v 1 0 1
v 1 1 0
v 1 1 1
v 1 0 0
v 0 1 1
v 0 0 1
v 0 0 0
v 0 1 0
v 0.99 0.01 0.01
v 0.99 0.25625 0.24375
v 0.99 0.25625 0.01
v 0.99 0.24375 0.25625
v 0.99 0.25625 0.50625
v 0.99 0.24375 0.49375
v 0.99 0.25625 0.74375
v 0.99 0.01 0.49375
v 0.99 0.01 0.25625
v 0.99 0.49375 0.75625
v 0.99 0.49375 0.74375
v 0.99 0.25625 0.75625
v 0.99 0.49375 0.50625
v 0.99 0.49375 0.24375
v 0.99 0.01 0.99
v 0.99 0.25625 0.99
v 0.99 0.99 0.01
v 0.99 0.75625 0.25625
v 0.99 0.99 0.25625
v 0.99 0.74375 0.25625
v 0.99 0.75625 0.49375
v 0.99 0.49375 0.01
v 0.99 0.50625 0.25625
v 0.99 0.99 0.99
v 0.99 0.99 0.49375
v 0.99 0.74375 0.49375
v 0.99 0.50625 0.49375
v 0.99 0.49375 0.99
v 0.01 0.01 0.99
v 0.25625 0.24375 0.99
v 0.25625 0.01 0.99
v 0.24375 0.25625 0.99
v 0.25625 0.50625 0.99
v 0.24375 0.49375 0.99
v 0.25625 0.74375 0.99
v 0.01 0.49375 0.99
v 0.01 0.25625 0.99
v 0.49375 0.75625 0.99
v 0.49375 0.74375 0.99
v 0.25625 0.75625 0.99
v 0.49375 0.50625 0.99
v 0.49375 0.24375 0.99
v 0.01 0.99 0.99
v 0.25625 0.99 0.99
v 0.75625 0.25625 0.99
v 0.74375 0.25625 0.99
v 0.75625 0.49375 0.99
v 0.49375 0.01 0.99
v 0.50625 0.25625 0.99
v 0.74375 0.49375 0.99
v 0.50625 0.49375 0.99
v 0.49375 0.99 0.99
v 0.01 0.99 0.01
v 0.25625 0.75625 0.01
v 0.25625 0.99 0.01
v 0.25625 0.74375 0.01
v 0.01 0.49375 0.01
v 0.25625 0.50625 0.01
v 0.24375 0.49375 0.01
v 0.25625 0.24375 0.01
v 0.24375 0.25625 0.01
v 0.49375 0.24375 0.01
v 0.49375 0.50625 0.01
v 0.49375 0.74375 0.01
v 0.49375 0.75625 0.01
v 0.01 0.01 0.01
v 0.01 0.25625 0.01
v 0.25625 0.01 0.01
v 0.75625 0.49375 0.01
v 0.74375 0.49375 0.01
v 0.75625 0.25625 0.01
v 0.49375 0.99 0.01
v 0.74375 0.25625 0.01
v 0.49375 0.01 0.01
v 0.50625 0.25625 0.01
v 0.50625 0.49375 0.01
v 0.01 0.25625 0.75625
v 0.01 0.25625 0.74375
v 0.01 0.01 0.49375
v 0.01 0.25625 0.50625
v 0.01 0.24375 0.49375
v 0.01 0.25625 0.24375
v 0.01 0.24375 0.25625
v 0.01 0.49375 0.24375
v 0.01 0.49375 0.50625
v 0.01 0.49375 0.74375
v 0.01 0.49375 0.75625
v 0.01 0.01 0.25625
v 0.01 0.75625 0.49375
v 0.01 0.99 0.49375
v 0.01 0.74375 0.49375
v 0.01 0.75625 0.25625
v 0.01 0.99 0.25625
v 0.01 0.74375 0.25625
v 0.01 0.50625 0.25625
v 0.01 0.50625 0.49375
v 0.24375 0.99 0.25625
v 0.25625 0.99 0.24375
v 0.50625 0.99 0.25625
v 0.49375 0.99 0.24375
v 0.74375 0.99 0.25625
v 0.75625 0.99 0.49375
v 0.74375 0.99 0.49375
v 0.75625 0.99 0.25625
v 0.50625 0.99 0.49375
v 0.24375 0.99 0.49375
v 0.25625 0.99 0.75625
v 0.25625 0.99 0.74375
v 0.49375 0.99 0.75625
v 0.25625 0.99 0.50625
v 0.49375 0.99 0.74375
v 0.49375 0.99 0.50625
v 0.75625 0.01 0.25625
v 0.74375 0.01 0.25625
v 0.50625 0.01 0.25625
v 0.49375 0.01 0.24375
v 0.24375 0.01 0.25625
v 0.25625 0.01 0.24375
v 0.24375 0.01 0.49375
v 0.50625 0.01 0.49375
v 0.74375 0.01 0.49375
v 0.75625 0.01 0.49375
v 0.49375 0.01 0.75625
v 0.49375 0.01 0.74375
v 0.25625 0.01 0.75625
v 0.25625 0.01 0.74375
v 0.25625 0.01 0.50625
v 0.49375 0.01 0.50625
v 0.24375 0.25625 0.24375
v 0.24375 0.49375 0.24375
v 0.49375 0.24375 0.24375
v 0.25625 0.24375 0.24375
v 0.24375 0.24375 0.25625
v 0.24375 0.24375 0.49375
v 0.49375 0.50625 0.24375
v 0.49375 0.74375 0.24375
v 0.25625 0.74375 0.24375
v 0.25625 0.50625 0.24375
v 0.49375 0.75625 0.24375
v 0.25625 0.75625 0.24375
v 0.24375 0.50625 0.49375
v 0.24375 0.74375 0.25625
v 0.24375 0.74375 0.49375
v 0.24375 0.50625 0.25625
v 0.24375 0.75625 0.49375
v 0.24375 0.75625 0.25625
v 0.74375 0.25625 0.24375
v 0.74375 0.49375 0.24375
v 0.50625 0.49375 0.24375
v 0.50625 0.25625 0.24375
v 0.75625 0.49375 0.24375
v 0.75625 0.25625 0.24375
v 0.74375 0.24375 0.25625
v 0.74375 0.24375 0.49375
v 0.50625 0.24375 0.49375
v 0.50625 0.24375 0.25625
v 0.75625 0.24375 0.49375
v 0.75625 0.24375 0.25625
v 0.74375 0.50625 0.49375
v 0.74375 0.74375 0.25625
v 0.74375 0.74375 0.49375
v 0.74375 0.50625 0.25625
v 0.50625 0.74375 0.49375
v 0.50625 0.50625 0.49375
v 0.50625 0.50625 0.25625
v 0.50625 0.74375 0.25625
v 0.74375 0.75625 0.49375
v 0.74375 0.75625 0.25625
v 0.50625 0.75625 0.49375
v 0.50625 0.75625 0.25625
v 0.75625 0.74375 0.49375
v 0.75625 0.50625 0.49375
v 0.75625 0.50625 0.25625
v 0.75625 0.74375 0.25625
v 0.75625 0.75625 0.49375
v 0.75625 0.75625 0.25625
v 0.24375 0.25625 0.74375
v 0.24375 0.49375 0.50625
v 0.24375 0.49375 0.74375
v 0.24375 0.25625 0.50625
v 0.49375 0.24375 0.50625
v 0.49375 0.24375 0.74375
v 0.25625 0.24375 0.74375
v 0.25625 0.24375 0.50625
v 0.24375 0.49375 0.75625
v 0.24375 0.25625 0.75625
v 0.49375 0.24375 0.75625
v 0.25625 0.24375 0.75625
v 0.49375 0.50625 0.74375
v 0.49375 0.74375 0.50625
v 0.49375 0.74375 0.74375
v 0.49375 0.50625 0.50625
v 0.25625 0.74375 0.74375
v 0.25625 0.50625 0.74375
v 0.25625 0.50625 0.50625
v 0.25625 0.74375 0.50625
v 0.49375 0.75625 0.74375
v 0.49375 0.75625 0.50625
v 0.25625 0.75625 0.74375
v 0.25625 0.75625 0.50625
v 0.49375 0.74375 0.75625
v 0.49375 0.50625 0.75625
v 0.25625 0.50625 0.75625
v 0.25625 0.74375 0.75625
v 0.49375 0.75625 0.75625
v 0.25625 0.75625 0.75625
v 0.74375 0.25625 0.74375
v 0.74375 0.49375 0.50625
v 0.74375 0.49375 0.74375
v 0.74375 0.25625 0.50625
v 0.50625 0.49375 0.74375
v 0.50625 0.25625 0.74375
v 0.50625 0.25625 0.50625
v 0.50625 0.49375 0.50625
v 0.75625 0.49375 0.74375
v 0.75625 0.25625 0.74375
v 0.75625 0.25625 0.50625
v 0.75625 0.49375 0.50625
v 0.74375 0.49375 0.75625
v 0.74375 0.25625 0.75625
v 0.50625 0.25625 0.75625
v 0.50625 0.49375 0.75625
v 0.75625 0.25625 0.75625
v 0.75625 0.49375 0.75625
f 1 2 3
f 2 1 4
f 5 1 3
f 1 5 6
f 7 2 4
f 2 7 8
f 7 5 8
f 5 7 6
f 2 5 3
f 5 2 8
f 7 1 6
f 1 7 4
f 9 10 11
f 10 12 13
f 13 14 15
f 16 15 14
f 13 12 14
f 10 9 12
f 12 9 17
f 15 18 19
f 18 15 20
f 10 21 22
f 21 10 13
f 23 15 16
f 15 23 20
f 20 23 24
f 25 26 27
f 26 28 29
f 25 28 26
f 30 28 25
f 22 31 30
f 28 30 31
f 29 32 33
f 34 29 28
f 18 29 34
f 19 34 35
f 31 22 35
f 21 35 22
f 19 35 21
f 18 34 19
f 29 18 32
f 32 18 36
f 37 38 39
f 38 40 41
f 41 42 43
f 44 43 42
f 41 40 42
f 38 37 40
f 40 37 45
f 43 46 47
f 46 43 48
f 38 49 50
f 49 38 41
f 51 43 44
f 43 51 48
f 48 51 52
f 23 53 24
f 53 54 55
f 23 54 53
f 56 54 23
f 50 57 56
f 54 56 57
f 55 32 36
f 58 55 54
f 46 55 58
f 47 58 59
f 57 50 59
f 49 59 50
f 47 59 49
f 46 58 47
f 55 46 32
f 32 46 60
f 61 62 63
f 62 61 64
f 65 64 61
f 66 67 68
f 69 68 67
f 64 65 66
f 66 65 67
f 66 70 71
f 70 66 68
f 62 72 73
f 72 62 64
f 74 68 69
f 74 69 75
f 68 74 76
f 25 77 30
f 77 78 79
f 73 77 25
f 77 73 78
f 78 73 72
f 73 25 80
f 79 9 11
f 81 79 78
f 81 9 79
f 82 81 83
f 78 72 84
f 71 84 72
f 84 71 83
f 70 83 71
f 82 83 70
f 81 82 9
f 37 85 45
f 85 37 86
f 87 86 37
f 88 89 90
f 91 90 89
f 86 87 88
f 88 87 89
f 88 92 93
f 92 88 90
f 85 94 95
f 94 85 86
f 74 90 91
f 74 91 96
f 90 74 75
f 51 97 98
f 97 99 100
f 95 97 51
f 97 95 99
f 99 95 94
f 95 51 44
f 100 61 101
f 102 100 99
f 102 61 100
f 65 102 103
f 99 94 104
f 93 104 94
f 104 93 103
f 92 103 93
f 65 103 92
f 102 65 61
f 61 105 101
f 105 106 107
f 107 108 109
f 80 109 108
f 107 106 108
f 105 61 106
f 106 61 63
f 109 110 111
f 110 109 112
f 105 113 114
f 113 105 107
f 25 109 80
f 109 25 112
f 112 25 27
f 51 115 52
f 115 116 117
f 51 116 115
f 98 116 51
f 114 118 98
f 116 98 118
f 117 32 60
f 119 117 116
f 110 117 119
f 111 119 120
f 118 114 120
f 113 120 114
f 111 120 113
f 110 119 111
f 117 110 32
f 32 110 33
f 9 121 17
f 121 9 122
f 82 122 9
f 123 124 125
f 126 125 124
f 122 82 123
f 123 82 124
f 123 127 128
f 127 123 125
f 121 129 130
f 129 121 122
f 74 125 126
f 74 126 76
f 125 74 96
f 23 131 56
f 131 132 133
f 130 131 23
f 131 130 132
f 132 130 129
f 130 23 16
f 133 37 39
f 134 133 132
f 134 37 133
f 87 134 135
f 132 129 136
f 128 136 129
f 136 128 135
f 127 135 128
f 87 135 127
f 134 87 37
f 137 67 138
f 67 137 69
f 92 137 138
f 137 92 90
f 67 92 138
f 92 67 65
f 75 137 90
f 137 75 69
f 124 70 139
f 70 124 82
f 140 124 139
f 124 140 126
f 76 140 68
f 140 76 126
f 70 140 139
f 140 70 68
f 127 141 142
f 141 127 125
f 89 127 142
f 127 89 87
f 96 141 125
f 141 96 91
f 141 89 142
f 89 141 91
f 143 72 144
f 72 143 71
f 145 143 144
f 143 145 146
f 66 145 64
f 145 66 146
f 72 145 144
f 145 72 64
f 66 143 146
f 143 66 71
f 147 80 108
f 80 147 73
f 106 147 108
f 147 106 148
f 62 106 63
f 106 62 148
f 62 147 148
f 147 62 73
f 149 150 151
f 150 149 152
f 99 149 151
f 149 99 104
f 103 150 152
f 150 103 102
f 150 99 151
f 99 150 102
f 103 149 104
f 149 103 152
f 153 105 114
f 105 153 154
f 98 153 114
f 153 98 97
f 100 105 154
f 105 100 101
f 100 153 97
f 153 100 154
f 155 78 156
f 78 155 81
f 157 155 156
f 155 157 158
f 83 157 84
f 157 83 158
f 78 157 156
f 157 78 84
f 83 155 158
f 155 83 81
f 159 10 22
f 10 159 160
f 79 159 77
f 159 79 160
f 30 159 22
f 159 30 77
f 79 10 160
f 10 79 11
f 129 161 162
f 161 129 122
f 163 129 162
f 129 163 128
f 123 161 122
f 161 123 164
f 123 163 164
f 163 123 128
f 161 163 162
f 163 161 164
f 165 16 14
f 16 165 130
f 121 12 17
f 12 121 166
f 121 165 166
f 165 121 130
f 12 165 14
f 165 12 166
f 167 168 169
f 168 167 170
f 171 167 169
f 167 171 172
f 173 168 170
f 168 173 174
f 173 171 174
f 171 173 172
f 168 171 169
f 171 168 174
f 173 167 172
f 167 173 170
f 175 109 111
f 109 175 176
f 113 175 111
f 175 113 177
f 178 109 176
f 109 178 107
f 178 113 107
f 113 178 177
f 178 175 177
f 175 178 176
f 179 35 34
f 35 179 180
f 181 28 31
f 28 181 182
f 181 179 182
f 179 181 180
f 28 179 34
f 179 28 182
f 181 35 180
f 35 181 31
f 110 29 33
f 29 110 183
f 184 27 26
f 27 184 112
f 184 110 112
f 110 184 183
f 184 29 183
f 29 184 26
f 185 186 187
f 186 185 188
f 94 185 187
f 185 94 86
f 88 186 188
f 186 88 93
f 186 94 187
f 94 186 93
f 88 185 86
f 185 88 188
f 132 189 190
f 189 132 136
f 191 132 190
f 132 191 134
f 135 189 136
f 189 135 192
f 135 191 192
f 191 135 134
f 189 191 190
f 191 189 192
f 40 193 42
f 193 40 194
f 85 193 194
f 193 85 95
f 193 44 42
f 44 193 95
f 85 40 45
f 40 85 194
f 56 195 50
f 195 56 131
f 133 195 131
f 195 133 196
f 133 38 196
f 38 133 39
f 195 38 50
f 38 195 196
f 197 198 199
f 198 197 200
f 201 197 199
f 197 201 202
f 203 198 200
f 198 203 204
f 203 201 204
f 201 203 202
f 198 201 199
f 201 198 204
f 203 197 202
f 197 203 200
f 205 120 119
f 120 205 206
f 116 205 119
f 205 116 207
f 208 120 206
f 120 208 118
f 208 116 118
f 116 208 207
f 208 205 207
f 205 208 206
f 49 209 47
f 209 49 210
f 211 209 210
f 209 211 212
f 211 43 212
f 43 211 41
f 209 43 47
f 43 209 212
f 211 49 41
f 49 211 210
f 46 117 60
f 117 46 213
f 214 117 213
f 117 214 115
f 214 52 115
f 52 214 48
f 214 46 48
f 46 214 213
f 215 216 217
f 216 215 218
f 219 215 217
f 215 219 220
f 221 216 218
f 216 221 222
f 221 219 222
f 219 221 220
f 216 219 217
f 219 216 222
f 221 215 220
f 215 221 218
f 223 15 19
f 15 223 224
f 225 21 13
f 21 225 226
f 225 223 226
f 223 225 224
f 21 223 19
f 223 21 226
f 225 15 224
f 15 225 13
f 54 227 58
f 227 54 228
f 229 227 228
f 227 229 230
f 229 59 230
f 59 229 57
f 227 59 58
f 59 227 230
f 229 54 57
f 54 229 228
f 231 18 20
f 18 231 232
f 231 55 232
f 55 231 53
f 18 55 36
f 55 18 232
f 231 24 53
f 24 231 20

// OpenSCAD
translate([0.125, 0.375, 0.125]) color([0.4703183481199785, 0.3254759962964807, 0.32630252970221674]) cube([0.2375, 0.2375, 0.2375], center=true);
translate([0.375, 0.125, 0.125]) color([0.6796714379674168, 0.8437235939520528, 0.8801077700011627]) cube([0.2375, 0.2375, 0.2375], center=true);
translate([0.125, 0.125, 0.375]) color([0.04502428554169691, 0.8748017228949428, 0.8322560314319196]) cube([0.2375, 0.2375, 0.2375], center=true);
translate([0.375, 0.625, 0.125]) color([0.8036923249655851, 0.7430775137198646, 0.5943313947956416]) cube([0.2375, 0.2375, 0.2375], center=true);
translate([0.375, 0.875, 0.125]) color([0.6656226459778893, 0.330749903774597, 0.868479640316589]) cube([0.2375, 0.2375, 0.2375], center=true);
translate([0.125, 0.625, 0.375]) color([0.9133558562455345, 0.9328092830291573, 0.965204480748708]) cube([0.2375, 0.2375, 0.2375], center=true);
translate([0.125, 0.875, 0.375]) color([0.04941488832108687, 0.9243989960853036, 0.6796238522220975]) cube([0.2375, 0.2375, 0.2375], center=true);
translate([0.625, 0.375, 0.125]) color([0.6165643145748532, 0.9826833521119438, 0.0255927122392261]) cube([0.2375, 0.2375, 0.2375], center=true);
translate([0.875, 0.375, 0.125]) color([0.6460098231560203, 0.7522484787761982, 0.959270299831535]) cube([0.2375, 0.2375, 0.2375], center=true);
translate([0.625, 0.125, 0.375]) color([0.1341133561002753, 0.3957775621053963, 0.2636741843460868]) cube([0.2375, 0.2375, 0.2375], center=true);
translate([0.875, 0.125, 0.375]) color([0.0089931536744019, 0.6293882137700114, 0.10699193015934139]) cube([0.2375, 0.2375, 0.2375], center=true);
translate([0.625, 0.625, 0.375]) color([0.7175713197745442, 0.005780007793811381, 0.39173693032620005]) cube([0.2375, 0.2375, 0.2375], center=true);
translate([0.625, 0.875, 0.375]) color([0.2452081522136732, 0.6267109108994009, 0.6522834644017423]) cube([0.2375, 0.2375, 0.2375], center=true);
translate([0.875, 0.625, 0.375]) color([0.9794507075148736, 0.15836622274147494, 0.5120520304374113]) cube([0.2375, 0.2375, 0.2375], center=true);
translate([0.875, 0.875, 0.375]) color([0.2530044018495886, 0.9503290425104016, 0.5032765343031246]) cube([0.2375, 0.2375, 0.2375], center=true);
translate([0.125, 0.375, 0.625]) color([0.3723307592388937, 0.2687975496070053, 0.5431010148318319]) cube([0.2375, 0.2375, 0.2375], center=true);
translate([0.375, 0.125, 0.625]) color([0.3390737213020516, 0.4953995731584907, 0.47426568178825046]) cube([0.2375, 0.2375, 0.2375], center=true);
translate([0.125, 0.375, 0.875]) color([0.7813281014383978, 0.7049040060844236, 0.6672020242354549]) cube([0.2375, 0.2375, 0.2375], center=true);
translate([0.375, 0.125, 0.875]) color([0.59891321162433, 0.20675941547323395, 0.4989320496811215]) cube([0.2375, 0.2375, 0.2375], center=true);
translate([0.375, 0.625, 0.625]) color([0.15860592767823745, 0.24362692220537363, 0.9223470492400727]) cube([0.2375, 0.2375, 0.2375], center=true);
translate([0.375, 0.875, 0.625]) color([0.08125028632768871, 0.08778967306208207, 0.1566294178982881]) cube([0.2375, 0.2375, 0.2375], center=true);
translate([0.375, 0.625, 0.875]) color([0.4881466097258217, 0.9394993485091689, 0.09483007936046162]) cube([0.2375, 0.2375, 0.2375], center=true);
translate([0.375, 0.875, 0.875]) color([0.7496523094784379, 0.698979968590827, 0.8137974970319007]) cube([0.2375, 0.2375, 0.2375], center=true);
translate([0.625, 0.375, 0.625]) color([0.2900989154375855, 0.4799983707352583, 0.7775393964930869]) cube([0.2375, 0.2375, 0.2375], center=true);
translate([0.875, 0.375, 0.625]) color([0.9388082122897282, 0.038854283444424764, 0.9925655674013534]) cube([0.2375, 0.2375, 0.2375], center=true);
translate([0.625, 0.375, 0.875]) color([0.44170260534215255, 0.5087868714146372, 0.3598719796518973]) cube([0.2375, 0.2375, 0.2375], center=true);
translate([0.875, 0.375, 0.875]) color([0.18460354523301148, 0.44970120413659875, 0.6501993296624843]) cube([0.2375, 0.2375, 0.2375], center=true);
color([0.3,0.3,0.3,0.3]) difference() { cube([1,1,1]); translate([0.01,0.01,0.01]) cube([0.98,0.98,0.98]); }
